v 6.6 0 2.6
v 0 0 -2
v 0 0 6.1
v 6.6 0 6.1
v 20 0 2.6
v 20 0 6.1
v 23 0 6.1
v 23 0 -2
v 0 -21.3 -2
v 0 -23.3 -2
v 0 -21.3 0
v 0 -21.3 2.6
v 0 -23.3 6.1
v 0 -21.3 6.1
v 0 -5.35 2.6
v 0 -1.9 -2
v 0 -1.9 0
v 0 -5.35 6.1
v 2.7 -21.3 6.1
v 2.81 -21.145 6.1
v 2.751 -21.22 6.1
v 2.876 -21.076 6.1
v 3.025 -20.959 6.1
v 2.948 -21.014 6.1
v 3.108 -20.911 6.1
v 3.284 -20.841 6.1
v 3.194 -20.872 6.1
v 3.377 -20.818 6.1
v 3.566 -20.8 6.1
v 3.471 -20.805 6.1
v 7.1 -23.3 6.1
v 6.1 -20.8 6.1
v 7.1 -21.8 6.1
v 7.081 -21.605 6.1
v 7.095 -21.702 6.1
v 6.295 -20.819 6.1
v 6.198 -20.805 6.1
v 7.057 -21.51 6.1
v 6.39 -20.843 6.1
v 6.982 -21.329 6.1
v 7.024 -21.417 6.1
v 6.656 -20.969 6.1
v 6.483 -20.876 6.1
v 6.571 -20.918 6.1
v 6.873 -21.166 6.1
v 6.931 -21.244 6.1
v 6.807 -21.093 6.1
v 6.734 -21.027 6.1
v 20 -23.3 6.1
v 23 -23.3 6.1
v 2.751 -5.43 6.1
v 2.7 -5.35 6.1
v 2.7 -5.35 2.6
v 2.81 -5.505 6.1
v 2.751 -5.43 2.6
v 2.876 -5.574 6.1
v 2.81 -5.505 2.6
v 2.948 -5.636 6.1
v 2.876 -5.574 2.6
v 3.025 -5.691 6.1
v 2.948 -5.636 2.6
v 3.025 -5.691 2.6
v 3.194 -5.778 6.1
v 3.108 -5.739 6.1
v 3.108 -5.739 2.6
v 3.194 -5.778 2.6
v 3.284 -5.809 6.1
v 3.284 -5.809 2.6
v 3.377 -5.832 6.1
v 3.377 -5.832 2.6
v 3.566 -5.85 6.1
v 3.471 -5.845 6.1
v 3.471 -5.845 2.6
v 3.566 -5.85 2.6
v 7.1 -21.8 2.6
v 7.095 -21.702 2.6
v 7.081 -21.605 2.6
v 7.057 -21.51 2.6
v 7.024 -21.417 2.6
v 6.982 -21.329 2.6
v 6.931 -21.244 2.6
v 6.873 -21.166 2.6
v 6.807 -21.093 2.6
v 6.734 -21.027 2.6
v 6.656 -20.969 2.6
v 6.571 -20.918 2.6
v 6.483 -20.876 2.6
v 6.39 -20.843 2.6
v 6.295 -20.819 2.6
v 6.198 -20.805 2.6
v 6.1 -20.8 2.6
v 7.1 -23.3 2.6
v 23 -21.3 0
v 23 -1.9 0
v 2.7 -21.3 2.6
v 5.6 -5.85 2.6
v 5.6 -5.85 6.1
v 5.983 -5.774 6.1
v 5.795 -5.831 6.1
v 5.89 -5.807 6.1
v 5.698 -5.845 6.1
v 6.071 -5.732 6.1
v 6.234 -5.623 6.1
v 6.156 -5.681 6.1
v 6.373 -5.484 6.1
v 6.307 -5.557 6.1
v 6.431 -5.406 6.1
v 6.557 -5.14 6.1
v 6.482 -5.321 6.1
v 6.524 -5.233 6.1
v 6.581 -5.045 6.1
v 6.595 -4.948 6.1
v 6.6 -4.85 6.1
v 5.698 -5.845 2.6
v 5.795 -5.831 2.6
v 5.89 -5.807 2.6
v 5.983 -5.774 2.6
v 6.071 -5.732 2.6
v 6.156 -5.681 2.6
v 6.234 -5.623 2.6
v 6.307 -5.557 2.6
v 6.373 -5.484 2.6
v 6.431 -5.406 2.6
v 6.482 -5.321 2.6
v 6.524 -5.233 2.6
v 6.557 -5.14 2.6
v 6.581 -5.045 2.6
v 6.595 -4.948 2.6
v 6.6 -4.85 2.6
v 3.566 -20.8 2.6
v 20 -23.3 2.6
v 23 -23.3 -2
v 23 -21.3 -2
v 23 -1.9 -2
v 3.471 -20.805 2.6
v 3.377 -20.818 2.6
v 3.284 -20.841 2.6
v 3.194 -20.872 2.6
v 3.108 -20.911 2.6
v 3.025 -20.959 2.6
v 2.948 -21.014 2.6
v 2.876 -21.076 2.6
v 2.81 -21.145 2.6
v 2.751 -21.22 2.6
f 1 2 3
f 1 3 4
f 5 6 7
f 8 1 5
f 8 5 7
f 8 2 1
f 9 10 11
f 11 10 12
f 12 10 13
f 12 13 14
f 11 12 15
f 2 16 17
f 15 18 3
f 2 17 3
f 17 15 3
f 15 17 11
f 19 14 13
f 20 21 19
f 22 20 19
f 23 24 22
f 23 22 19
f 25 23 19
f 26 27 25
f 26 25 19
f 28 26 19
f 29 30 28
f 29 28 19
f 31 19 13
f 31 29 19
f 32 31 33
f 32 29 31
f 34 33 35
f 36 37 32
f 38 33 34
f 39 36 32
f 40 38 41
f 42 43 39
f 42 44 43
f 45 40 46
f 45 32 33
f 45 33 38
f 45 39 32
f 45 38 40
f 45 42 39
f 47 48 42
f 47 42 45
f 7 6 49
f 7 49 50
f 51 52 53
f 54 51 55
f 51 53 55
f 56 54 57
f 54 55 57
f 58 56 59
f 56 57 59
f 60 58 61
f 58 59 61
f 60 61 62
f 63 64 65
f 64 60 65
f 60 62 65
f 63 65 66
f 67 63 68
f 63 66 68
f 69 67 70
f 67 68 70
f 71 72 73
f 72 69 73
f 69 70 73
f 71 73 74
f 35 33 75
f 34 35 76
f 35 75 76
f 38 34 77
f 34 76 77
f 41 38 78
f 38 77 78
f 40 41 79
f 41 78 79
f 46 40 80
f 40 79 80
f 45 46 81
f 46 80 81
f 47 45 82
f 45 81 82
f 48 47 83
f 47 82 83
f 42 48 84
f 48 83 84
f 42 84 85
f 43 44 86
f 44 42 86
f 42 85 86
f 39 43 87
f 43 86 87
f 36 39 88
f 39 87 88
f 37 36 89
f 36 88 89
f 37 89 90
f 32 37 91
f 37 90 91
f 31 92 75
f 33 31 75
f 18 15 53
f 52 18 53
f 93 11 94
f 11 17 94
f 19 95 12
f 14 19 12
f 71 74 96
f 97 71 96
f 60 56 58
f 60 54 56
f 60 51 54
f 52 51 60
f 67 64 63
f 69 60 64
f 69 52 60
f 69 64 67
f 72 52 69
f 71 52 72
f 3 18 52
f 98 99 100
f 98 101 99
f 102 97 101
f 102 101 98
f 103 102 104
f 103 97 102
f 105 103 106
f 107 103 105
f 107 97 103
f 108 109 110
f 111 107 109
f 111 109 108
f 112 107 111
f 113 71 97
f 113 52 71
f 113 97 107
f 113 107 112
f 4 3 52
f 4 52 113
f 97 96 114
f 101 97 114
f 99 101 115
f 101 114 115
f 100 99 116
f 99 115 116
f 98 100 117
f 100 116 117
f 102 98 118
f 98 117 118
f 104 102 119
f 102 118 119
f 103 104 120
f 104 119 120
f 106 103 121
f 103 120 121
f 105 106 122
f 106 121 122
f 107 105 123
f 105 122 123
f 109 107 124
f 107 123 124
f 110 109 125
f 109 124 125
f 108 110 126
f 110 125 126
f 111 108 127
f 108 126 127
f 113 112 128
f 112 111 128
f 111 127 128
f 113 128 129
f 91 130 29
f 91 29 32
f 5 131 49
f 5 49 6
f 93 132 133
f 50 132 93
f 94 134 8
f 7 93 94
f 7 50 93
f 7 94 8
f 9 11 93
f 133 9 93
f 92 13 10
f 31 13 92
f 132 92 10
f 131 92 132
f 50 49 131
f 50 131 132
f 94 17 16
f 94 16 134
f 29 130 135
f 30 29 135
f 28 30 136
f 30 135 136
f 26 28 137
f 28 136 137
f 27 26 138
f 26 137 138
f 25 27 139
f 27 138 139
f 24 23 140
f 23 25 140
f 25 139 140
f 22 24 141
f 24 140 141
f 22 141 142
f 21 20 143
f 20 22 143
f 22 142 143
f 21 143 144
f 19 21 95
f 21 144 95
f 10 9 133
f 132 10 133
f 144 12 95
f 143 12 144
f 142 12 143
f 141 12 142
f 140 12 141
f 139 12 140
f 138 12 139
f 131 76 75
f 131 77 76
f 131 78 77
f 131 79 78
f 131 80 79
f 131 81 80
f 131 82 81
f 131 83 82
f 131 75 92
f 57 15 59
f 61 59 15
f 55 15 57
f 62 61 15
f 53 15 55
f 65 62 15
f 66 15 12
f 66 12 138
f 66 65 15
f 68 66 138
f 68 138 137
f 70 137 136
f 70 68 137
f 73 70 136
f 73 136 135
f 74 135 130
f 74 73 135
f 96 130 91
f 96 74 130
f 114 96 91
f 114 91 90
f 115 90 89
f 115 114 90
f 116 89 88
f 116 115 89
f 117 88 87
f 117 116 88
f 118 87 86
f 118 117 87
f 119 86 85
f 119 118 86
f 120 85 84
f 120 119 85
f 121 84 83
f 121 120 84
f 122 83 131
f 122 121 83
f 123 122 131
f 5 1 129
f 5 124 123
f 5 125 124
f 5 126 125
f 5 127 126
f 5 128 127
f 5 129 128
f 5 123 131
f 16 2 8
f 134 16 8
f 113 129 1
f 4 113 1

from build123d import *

# Parameters (mm, degrees)
F1_DEPTH    = 2.6
F0_W        = 3
F0_H        = 23.3
F0_W_2      = 4.4
F0_H_2      = 0.5
F0_W_3      = 3.9
F2_DEPTH    = 6.1
F3_T1_DEPTH = 6
F3_T3_DEPTH = 5.6650635095
F4_W        = 23
F4_H        = 2
F4_H_2      = 1.9
F5_DEPTH    = 2


# Not quite as in the source:
# - a fillet or chamfer that OpenCascade refuses, or shapes differently, is made with other operations: its cross-section is extruded or revolved along the edge and cut away or added


with BuildPart() as f1:
    # F0 (on Top) → F1 (new body)
    with BuildSketch(Plane.XY):
        Polygon((20, 0), (6.6, 0), (6.6, -5.35), (6.6, -5.85), (2.7, -5.85), (2.7, -5.35), (0, -5.35), (0, -21.3), (2.7, -21.3), (2.7, -20.8), (7.1, -20.8), (7.1, -21.3), (7.1, -23.3), (20, -23.3), align=None)
    extrude(amount=F1_DEPTH)

    # F0 (on Top) → F2 (join)
    with BuildSketch(Plane.XY):
        with Locations((21.5, -11.65)):
            Rectangle(F0_W, F0_H)
        Polygon((2.7, -21.3), (0, -21.3), (0, -23.3), (7.1, -23.3), (7.1, -21.3), align=None)
        Polygon((6.6, 0), (0, 0), (0, -5.35), (2.7, -5.35), (6.6, -5.35), align=None)
        with Locations((4.9, -21.05)):
            Rectangle(F0_W_2, F0_H_2)
        with Locations((4.65, -5.6)):
            Rectangle(F0_W_3, F0_H_2)
    extrude(amount=F2_DEPTH)

    # F3: fillet of radius 1 on 4 edges, made by hand

    # F3_s2 → F3_t1 (cut)
    with BuildSketch(Plane.XY.offset(2.6)):
        with BuildLine():
            ThreePointArc((7.1, -21.8), (6.8071067812, -21.0928932188), (6.1, -20.8))
            Line((6.1, -20.8), (7.1, -20.8))
            Line((7.1, -20.8), (7.1, -21.8))
        make_face()
        with BuildLine():
            ThreePointArc((5.6, -5.85), (6.3071067812, -5.5571067812), (6.6, -4.85))
            Line((6.6, -4.85), (6.6, -5.85))
            Line((6.6, -5.85), (5.6, -5.85))
        make_face()
    extrude(amount=F3_T1_DEPTH, mode=Mode.SUBTRACT)

    # F3_s4 → F3_t3 (cut)
    with BuildSketch(Plane.XY.offset(2.6)):
        with BuildLine():
            ThreePointArc((3.5660254038, -20.8), (3.0660254038, -20.9339745962), (2.7, -21.3))
            Line((2.7, -21.3), (2.7, -20.8))
            Line((2.7, -20.8), (3.5660254038, -20.8))
        make_face()
        with BuildLine():
            ThreePointArc((2.7, -5.35), (3.0660254038, -5.7160254038), (3.5660254038, -5.85))
            Line((3.5660254038, -5.85), (2.7, -5.85))
            Line((2.7, -5.85), (2.7, -5.35))
        make_face()
    extrude(amount=F3_T3_DEPTH, mode=Mode.SUBTRACT)

    # F4 (on Top) → F5 (join)
    with BuildSketch(Plane.XY):
        with Locations((11.5, -22.3)):
            Rectangle(F4_W, F4_H)
        with Locations((11.5, -0.95)):
            Rectangle(F4_W, F4_H_2)
    extrude(amount=-F5_DEPTH)


solid = f1.part
